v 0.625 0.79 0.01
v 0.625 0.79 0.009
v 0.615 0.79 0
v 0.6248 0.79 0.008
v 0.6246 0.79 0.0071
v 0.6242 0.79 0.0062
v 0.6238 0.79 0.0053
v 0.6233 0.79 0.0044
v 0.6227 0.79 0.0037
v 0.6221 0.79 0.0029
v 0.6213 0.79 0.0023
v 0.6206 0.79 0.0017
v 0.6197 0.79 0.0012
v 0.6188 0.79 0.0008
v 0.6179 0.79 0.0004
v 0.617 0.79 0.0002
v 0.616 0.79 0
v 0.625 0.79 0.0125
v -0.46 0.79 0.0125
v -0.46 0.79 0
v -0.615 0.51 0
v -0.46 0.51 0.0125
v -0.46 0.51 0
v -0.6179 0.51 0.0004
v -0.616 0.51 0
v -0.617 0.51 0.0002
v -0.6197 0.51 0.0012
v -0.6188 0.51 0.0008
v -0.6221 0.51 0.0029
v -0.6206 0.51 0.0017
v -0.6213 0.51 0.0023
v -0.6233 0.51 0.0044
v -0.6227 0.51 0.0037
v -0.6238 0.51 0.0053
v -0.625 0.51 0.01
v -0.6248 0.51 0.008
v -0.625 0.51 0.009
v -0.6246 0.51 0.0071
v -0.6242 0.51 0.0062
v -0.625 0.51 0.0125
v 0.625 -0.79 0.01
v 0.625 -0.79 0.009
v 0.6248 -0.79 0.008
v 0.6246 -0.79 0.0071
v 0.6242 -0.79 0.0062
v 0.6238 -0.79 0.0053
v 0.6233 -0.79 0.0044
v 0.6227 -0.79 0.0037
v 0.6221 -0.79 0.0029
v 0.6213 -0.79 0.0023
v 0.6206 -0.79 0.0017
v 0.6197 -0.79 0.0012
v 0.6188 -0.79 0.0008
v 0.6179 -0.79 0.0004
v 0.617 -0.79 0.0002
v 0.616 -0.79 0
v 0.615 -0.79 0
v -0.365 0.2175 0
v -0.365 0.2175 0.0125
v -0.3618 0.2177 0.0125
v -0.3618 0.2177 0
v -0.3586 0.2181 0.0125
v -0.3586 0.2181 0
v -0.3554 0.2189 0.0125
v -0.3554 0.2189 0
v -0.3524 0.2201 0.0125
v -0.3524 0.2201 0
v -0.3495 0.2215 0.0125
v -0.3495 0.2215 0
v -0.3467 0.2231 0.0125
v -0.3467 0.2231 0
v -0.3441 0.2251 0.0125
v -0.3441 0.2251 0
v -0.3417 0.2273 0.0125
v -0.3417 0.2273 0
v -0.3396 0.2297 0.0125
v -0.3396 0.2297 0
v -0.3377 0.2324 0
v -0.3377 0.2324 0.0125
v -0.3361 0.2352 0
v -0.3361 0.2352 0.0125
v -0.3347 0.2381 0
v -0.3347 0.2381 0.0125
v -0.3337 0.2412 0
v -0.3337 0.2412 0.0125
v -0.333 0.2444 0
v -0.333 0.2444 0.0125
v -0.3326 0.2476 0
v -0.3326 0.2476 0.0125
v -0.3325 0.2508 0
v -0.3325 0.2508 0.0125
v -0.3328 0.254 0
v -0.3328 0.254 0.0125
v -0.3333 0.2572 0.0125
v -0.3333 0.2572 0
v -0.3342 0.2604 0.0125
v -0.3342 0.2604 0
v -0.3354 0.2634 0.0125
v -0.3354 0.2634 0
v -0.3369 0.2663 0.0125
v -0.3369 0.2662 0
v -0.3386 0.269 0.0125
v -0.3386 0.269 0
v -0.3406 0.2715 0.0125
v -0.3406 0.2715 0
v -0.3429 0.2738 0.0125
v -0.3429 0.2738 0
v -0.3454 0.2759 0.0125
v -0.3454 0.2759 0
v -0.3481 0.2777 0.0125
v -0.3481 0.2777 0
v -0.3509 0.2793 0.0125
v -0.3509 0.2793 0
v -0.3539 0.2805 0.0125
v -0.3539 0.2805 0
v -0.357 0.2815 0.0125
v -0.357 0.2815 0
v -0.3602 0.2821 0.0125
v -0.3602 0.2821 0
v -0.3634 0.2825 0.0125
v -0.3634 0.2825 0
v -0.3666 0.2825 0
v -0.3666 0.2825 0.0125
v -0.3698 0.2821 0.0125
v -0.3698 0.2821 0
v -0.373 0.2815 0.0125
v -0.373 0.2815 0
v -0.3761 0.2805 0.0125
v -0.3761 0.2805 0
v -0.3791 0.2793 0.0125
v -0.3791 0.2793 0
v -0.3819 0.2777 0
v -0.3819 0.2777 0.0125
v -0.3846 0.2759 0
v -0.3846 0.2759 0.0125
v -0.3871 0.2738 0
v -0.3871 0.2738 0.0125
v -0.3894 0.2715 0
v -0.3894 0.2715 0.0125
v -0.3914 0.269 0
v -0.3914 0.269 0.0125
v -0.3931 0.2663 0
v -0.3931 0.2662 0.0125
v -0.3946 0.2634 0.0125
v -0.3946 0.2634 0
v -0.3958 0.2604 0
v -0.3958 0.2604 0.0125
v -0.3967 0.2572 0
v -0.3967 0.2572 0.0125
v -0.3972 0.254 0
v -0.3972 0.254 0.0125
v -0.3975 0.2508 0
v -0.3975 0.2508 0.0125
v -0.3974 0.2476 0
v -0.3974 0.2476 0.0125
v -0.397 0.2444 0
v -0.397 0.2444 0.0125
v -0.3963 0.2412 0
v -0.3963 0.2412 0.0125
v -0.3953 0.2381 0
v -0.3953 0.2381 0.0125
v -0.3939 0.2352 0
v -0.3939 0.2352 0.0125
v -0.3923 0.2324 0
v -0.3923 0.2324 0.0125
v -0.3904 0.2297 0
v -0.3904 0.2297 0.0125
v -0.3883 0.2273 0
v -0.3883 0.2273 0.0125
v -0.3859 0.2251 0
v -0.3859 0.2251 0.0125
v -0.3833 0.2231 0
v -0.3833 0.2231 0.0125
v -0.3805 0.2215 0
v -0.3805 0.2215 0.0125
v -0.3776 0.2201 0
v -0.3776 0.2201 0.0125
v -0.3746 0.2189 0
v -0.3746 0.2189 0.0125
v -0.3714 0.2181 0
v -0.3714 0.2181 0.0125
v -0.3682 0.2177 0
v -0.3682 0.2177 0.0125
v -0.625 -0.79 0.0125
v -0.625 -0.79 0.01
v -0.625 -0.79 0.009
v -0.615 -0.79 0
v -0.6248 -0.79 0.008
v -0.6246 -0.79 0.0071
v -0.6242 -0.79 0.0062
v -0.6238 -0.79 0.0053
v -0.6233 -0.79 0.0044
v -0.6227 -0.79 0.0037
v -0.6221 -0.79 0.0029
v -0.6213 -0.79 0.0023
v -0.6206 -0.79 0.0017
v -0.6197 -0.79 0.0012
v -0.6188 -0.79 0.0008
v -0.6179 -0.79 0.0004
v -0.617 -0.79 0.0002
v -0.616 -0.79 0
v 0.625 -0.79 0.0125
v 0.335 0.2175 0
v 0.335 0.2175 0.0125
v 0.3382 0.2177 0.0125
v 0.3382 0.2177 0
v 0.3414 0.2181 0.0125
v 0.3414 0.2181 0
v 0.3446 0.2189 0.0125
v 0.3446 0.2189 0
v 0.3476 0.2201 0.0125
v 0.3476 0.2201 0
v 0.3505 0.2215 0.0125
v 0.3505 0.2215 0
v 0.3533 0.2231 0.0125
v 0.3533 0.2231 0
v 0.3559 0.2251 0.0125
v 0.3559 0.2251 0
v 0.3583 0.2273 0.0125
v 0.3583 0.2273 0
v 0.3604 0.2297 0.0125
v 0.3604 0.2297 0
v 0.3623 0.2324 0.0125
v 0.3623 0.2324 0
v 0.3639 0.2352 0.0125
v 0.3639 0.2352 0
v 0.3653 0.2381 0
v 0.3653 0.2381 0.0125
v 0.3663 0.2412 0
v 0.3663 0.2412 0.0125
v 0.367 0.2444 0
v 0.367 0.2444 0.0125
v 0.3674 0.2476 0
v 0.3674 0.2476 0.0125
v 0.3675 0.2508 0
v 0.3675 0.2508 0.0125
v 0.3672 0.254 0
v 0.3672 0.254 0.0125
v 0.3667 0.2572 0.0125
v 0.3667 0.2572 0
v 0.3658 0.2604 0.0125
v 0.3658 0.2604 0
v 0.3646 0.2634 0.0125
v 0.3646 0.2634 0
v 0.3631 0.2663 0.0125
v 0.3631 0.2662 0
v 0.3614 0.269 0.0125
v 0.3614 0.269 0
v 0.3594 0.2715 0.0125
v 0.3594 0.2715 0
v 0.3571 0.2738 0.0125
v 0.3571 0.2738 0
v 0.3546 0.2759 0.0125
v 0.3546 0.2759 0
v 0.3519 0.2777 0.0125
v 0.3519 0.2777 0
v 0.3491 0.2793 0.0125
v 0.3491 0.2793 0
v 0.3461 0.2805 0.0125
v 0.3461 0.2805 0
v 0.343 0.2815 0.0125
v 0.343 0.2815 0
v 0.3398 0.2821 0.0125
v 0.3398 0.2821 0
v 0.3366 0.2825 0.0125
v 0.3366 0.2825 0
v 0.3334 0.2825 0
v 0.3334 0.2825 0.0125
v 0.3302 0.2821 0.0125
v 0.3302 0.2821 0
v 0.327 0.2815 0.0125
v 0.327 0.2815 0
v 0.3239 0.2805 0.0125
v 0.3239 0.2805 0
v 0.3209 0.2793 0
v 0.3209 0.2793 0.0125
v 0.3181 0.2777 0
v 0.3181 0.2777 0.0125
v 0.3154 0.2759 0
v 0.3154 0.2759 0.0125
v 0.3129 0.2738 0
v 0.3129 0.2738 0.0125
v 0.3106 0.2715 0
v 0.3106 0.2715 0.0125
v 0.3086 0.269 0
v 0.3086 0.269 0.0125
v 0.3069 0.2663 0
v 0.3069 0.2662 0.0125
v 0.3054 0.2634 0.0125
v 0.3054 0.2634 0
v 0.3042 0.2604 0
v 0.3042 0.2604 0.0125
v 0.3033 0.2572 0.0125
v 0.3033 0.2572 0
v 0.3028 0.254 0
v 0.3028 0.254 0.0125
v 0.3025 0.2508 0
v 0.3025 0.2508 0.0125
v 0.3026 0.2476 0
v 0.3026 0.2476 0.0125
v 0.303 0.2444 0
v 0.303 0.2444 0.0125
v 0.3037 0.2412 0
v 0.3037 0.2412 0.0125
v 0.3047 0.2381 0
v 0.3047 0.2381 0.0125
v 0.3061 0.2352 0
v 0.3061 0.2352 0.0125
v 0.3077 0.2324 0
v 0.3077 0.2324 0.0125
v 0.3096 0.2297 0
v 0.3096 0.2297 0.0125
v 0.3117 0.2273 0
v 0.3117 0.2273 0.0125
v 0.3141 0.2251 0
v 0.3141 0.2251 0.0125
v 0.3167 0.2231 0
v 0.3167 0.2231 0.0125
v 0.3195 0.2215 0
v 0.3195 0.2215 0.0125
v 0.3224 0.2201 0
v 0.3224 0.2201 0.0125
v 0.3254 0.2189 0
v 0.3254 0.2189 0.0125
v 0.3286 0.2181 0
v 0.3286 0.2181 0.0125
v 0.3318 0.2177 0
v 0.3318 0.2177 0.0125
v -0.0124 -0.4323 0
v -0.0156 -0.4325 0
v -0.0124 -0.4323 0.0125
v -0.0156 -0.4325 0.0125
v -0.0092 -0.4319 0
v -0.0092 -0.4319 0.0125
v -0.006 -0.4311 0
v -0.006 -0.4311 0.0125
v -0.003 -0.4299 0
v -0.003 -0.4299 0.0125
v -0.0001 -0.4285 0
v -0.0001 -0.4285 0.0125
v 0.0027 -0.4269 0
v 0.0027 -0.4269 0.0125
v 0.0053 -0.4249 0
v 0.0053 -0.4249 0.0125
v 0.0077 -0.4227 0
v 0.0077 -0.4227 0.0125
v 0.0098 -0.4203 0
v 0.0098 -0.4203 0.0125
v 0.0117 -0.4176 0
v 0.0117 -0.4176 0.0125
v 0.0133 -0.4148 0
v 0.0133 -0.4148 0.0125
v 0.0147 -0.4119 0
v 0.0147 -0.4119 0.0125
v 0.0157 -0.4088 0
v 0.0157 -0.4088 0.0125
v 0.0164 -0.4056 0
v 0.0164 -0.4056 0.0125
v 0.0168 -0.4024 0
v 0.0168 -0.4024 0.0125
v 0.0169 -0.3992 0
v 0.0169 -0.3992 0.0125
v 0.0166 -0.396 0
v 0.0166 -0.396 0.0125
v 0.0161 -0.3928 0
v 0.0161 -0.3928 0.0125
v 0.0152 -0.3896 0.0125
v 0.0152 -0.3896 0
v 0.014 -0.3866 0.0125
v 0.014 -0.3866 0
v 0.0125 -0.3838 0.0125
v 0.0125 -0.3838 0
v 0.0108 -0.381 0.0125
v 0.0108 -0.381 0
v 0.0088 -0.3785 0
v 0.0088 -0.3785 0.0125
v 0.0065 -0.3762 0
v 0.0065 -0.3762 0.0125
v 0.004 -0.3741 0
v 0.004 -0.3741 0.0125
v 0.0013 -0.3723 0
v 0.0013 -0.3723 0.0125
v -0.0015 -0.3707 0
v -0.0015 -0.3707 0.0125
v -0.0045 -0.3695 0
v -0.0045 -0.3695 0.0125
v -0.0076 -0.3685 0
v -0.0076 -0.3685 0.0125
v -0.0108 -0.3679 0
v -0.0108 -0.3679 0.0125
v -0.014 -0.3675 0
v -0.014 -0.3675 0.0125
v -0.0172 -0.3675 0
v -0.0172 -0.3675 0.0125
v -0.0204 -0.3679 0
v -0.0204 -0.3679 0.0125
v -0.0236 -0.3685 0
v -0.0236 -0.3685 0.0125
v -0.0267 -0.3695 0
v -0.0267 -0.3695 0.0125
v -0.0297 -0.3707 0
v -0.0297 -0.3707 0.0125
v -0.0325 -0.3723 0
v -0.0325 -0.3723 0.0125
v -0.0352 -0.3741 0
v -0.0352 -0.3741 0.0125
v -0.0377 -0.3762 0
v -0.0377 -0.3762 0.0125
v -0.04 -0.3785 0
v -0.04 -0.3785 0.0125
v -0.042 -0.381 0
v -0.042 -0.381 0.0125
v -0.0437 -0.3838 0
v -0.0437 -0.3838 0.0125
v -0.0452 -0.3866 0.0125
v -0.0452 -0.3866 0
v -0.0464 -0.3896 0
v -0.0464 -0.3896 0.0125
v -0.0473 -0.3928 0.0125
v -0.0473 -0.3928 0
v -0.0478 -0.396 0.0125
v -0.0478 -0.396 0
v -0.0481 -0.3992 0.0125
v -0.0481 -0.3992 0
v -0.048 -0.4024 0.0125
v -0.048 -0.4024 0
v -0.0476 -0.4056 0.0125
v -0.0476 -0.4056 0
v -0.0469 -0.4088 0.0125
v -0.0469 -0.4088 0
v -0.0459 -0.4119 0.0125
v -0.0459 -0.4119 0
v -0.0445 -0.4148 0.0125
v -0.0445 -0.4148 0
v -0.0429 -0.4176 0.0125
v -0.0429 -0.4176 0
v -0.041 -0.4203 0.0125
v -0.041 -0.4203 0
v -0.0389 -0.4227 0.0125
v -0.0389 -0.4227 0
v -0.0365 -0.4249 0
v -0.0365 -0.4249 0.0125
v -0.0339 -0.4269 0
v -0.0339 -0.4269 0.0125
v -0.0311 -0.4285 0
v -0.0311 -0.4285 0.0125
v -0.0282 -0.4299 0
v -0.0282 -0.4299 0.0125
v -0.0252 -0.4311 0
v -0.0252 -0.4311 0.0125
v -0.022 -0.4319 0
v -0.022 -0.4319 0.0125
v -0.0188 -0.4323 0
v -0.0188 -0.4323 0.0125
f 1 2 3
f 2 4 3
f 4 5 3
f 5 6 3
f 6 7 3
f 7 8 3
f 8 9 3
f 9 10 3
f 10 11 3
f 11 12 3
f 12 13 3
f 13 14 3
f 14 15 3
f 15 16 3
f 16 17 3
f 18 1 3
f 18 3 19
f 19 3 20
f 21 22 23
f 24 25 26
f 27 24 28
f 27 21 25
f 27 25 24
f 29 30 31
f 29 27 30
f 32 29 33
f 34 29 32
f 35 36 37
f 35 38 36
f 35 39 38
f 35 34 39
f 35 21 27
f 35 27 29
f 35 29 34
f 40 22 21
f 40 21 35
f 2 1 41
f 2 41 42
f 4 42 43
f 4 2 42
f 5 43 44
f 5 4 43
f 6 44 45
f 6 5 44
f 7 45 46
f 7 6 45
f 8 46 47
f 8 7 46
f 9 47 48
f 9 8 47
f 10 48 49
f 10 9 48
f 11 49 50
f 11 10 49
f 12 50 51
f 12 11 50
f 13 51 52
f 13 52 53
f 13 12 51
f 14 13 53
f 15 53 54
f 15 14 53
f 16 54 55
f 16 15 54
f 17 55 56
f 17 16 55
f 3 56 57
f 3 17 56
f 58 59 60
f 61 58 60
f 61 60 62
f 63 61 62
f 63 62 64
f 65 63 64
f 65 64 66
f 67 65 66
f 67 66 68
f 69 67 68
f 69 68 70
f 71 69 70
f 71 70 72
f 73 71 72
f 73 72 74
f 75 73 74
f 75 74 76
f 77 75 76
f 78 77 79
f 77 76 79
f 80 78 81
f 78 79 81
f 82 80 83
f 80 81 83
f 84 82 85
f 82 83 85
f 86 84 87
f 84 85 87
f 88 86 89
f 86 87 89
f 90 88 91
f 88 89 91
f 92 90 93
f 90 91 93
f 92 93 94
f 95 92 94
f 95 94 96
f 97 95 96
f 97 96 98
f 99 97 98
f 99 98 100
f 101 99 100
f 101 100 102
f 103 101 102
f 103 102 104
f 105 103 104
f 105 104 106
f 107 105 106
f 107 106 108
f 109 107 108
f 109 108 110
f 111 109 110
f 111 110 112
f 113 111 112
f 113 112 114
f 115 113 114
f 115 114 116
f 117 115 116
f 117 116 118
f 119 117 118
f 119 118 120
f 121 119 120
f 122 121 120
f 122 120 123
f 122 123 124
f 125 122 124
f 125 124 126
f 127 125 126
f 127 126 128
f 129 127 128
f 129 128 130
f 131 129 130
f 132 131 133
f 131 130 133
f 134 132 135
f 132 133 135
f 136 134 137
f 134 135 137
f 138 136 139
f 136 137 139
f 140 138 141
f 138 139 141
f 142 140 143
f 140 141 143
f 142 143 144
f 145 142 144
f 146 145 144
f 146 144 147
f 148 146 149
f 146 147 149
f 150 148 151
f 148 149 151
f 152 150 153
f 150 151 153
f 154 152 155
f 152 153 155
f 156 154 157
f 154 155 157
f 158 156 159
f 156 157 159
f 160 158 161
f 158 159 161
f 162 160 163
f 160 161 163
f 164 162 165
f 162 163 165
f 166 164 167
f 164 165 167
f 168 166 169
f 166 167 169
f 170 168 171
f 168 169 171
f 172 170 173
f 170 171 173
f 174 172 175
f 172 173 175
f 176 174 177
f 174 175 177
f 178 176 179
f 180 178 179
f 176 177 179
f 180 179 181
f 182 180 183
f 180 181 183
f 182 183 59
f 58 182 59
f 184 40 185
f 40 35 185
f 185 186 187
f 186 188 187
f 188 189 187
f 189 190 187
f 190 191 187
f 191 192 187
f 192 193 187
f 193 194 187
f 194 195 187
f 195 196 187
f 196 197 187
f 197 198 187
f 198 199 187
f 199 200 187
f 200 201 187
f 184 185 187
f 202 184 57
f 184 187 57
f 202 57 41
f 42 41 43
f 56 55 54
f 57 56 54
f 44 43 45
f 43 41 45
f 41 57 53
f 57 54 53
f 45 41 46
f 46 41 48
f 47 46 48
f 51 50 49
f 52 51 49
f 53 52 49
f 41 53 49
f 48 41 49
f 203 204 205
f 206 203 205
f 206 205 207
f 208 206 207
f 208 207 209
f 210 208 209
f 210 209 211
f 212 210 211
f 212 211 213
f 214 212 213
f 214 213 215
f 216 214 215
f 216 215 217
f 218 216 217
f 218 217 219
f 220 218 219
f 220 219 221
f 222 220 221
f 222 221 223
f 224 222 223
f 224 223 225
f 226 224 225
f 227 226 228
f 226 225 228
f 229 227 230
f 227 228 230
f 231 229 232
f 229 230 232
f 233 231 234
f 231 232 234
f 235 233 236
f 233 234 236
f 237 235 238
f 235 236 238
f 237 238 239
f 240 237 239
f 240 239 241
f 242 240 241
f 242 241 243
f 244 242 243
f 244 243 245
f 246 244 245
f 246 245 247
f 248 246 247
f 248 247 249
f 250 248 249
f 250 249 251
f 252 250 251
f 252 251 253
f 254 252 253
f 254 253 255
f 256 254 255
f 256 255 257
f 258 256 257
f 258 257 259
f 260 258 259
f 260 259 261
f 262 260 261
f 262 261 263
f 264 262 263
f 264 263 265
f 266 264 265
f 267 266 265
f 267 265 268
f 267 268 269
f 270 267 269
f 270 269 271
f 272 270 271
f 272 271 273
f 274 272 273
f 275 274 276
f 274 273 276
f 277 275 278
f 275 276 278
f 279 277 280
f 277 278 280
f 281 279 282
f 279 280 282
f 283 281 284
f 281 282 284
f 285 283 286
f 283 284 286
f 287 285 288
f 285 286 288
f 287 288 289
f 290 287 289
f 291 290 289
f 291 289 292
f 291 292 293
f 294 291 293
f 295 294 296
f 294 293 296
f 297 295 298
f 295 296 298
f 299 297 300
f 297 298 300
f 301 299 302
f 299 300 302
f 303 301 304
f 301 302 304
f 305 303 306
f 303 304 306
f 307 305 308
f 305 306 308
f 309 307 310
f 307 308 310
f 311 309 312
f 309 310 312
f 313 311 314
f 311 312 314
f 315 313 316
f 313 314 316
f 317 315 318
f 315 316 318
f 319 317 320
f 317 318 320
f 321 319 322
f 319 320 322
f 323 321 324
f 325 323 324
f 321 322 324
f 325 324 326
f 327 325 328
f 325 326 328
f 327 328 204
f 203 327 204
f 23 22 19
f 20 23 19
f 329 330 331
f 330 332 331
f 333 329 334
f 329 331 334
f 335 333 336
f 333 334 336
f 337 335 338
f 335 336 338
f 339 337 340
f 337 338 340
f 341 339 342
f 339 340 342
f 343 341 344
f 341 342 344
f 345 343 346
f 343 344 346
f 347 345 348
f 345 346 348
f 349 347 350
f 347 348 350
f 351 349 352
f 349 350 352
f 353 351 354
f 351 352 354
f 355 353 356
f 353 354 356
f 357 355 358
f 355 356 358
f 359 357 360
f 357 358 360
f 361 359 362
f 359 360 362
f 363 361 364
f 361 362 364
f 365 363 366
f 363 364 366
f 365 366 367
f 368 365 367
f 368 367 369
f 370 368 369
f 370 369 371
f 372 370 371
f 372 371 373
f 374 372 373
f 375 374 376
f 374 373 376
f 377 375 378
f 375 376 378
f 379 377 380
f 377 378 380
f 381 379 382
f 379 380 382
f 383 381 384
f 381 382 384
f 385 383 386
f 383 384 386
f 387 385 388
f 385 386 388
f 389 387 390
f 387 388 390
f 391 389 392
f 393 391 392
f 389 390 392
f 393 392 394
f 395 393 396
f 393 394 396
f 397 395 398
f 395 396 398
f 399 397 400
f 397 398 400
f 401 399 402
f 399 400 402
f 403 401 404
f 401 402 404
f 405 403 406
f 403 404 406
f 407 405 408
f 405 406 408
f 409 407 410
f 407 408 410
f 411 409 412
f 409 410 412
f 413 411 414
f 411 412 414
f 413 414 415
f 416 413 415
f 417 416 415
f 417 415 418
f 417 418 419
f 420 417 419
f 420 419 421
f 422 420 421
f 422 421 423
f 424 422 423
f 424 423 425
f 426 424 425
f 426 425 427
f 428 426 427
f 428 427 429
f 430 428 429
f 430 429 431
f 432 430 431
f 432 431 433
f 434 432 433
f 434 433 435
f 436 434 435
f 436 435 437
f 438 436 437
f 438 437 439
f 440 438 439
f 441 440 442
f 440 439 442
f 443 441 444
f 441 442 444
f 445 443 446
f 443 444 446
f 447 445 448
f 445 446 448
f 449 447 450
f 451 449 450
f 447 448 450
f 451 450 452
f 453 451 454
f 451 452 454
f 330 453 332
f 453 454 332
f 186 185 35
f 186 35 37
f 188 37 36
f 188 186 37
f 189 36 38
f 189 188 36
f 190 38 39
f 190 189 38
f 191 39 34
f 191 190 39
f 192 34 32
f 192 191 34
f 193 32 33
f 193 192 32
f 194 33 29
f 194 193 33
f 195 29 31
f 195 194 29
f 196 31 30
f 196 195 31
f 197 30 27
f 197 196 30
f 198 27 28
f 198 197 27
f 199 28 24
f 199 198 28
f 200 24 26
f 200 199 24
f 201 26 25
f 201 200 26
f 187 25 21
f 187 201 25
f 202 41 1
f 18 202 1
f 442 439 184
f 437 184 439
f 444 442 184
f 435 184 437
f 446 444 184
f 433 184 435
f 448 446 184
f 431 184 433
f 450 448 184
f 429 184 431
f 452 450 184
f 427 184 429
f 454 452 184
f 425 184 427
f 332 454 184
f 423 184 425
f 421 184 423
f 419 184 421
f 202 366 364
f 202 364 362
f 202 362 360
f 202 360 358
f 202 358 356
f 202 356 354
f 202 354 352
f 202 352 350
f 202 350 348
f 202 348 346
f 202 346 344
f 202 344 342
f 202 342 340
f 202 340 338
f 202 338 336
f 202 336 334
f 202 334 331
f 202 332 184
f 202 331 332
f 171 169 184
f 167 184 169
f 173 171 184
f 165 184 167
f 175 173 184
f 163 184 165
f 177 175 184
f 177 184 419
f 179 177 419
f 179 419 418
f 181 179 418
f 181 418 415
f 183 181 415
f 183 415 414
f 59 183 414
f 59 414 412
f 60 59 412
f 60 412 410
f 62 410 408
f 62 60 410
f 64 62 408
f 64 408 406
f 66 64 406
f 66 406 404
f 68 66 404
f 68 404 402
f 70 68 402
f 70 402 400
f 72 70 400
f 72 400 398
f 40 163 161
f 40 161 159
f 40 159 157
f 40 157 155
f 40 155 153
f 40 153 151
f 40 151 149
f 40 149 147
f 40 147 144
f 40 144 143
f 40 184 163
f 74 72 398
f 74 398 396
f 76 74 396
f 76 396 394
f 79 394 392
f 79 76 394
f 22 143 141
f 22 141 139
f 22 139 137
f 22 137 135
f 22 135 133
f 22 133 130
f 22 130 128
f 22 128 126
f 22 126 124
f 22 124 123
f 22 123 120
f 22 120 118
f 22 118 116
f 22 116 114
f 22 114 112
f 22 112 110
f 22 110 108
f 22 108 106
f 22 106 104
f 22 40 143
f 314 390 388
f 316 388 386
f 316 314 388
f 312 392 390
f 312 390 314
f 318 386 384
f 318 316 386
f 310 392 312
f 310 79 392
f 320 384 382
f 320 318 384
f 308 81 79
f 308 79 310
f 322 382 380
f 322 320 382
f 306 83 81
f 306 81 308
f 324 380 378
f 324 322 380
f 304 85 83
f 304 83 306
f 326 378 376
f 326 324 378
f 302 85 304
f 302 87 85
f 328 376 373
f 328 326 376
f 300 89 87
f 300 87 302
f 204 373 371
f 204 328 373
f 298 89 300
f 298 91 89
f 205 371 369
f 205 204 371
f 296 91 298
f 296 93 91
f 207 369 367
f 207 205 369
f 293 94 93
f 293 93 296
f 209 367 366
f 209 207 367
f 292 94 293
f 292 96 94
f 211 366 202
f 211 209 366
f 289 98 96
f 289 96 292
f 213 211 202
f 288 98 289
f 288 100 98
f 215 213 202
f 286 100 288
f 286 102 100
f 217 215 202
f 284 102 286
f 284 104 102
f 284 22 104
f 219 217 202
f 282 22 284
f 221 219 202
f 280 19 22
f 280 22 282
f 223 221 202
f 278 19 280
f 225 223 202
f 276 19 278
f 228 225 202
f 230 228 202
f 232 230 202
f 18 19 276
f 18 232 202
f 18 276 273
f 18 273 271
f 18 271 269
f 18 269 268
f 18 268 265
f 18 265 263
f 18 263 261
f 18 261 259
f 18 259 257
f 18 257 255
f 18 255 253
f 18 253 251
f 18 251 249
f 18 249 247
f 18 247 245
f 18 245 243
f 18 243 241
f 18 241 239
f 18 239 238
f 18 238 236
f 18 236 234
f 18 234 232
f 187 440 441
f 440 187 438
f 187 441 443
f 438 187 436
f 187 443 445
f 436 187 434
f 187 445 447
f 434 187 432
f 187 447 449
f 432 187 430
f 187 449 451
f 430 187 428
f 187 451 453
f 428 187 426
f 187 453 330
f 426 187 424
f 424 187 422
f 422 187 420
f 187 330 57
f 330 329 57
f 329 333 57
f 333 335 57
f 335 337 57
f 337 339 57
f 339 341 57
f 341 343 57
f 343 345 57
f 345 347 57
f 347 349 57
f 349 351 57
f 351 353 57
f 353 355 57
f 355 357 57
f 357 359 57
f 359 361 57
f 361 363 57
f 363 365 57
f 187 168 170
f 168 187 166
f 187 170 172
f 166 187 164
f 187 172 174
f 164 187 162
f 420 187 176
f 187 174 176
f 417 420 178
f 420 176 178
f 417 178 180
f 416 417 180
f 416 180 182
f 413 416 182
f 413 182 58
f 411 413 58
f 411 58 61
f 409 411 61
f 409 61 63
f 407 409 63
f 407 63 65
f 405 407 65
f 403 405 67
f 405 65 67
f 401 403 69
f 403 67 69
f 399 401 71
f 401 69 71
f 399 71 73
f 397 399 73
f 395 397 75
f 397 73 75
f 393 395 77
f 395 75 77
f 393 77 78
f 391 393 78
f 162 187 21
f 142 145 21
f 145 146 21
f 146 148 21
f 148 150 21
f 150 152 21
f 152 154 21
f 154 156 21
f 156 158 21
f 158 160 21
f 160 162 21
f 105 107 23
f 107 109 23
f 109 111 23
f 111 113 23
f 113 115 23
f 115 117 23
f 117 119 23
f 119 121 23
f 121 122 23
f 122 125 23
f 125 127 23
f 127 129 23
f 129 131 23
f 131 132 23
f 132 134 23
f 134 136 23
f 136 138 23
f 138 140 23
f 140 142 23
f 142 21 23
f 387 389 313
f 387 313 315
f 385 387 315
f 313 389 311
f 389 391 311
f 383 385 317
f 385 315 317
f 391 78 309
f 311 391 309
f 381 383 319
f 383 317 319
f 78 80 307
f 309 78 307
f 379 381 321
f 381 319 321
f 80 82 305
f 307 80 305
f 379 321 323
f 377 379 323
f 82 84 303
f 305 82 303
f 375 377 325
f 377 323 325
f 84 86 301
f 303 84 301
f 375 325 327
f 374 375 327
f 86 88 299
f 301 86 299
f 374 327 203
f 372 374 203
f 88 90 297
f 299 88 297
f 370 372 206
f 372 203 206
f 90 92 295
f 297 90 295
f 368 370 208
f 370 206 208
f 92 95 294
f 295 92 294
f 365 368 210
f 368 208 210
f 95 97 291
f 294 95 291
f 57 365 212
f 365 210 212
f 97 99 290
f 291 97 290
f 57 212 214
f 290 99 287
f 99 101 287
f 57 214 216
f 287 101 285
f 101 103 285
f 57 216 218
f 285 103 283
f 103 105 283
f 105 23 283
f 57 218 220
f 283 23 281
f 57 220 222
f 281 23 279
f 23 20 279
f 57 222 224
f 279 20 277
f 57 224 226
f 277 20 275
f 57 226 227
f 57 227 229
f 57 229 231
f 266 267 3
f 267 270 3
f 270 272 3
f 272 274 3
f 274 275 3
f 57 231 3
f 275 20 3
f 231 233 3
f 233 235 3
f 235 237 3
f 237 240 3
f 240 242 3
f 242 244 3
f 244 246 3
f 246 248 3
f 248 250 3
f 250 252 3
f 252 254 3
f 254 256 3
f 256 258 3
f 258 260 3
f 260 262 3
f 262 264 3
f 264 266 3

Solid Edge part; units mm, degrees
sketch "Sketch1" plane through (0, 0, 0) normal (0, 0, 1) x (1, 0, 0)
  line L0 (-0.625, -0.79) -> (0.625, -0.79)
  line L1 (0.625, -0.79) -> (0.625, 0.79)
  line L2 (0.625, 0.79) -> (-0.625, 0.79)
  line L3 (-0.625, 0.79) -> (-0.625, -0.79)
  dimension "D1" = 1.25
  dimension "D2" = 1.58
extrude "Protrusion1" add sketch "Sketch1" along normal blind 0.0125
fillet "Verrundung_1" radius 0.01 2 edges at (-0.625, 0, 0) (0.625, 0, 0)
hole "Bohrung_1" at (0.335, 0.25, 0.0125) direction (0, 0, -1) diameter 0.065 end up to next
hole "Hole1" [suppressed]
hole "Hole2" [suppressed]
hole "Hole3" at (-0.365, 0.25, 0.0125) direction (0, 0, -1) diameter 0.065 end up to next
hole "Hole4" at (-0.0156, -0.4, 0.0125) direction (0, 0, -1) diameter 0.065 end up to next
sketch "Sketch2" plane through (0, 0, 0.0125) normal (0, 0, 1) x (1, 0, 0)
  line L0 (-0.79, 0.51) -> (-0.79, 0.79)
  line L1 (-0.79, 0.79) -> (-0.46, 0.79)
  line L2 (-0.46, 0.51) -> (-0.46, 0.79)
  line L3 (-0.46, 0.51) -> (-0.79, 0.51)
extrude "Cutout1" cut sketch "Sketch2" against normal through all
